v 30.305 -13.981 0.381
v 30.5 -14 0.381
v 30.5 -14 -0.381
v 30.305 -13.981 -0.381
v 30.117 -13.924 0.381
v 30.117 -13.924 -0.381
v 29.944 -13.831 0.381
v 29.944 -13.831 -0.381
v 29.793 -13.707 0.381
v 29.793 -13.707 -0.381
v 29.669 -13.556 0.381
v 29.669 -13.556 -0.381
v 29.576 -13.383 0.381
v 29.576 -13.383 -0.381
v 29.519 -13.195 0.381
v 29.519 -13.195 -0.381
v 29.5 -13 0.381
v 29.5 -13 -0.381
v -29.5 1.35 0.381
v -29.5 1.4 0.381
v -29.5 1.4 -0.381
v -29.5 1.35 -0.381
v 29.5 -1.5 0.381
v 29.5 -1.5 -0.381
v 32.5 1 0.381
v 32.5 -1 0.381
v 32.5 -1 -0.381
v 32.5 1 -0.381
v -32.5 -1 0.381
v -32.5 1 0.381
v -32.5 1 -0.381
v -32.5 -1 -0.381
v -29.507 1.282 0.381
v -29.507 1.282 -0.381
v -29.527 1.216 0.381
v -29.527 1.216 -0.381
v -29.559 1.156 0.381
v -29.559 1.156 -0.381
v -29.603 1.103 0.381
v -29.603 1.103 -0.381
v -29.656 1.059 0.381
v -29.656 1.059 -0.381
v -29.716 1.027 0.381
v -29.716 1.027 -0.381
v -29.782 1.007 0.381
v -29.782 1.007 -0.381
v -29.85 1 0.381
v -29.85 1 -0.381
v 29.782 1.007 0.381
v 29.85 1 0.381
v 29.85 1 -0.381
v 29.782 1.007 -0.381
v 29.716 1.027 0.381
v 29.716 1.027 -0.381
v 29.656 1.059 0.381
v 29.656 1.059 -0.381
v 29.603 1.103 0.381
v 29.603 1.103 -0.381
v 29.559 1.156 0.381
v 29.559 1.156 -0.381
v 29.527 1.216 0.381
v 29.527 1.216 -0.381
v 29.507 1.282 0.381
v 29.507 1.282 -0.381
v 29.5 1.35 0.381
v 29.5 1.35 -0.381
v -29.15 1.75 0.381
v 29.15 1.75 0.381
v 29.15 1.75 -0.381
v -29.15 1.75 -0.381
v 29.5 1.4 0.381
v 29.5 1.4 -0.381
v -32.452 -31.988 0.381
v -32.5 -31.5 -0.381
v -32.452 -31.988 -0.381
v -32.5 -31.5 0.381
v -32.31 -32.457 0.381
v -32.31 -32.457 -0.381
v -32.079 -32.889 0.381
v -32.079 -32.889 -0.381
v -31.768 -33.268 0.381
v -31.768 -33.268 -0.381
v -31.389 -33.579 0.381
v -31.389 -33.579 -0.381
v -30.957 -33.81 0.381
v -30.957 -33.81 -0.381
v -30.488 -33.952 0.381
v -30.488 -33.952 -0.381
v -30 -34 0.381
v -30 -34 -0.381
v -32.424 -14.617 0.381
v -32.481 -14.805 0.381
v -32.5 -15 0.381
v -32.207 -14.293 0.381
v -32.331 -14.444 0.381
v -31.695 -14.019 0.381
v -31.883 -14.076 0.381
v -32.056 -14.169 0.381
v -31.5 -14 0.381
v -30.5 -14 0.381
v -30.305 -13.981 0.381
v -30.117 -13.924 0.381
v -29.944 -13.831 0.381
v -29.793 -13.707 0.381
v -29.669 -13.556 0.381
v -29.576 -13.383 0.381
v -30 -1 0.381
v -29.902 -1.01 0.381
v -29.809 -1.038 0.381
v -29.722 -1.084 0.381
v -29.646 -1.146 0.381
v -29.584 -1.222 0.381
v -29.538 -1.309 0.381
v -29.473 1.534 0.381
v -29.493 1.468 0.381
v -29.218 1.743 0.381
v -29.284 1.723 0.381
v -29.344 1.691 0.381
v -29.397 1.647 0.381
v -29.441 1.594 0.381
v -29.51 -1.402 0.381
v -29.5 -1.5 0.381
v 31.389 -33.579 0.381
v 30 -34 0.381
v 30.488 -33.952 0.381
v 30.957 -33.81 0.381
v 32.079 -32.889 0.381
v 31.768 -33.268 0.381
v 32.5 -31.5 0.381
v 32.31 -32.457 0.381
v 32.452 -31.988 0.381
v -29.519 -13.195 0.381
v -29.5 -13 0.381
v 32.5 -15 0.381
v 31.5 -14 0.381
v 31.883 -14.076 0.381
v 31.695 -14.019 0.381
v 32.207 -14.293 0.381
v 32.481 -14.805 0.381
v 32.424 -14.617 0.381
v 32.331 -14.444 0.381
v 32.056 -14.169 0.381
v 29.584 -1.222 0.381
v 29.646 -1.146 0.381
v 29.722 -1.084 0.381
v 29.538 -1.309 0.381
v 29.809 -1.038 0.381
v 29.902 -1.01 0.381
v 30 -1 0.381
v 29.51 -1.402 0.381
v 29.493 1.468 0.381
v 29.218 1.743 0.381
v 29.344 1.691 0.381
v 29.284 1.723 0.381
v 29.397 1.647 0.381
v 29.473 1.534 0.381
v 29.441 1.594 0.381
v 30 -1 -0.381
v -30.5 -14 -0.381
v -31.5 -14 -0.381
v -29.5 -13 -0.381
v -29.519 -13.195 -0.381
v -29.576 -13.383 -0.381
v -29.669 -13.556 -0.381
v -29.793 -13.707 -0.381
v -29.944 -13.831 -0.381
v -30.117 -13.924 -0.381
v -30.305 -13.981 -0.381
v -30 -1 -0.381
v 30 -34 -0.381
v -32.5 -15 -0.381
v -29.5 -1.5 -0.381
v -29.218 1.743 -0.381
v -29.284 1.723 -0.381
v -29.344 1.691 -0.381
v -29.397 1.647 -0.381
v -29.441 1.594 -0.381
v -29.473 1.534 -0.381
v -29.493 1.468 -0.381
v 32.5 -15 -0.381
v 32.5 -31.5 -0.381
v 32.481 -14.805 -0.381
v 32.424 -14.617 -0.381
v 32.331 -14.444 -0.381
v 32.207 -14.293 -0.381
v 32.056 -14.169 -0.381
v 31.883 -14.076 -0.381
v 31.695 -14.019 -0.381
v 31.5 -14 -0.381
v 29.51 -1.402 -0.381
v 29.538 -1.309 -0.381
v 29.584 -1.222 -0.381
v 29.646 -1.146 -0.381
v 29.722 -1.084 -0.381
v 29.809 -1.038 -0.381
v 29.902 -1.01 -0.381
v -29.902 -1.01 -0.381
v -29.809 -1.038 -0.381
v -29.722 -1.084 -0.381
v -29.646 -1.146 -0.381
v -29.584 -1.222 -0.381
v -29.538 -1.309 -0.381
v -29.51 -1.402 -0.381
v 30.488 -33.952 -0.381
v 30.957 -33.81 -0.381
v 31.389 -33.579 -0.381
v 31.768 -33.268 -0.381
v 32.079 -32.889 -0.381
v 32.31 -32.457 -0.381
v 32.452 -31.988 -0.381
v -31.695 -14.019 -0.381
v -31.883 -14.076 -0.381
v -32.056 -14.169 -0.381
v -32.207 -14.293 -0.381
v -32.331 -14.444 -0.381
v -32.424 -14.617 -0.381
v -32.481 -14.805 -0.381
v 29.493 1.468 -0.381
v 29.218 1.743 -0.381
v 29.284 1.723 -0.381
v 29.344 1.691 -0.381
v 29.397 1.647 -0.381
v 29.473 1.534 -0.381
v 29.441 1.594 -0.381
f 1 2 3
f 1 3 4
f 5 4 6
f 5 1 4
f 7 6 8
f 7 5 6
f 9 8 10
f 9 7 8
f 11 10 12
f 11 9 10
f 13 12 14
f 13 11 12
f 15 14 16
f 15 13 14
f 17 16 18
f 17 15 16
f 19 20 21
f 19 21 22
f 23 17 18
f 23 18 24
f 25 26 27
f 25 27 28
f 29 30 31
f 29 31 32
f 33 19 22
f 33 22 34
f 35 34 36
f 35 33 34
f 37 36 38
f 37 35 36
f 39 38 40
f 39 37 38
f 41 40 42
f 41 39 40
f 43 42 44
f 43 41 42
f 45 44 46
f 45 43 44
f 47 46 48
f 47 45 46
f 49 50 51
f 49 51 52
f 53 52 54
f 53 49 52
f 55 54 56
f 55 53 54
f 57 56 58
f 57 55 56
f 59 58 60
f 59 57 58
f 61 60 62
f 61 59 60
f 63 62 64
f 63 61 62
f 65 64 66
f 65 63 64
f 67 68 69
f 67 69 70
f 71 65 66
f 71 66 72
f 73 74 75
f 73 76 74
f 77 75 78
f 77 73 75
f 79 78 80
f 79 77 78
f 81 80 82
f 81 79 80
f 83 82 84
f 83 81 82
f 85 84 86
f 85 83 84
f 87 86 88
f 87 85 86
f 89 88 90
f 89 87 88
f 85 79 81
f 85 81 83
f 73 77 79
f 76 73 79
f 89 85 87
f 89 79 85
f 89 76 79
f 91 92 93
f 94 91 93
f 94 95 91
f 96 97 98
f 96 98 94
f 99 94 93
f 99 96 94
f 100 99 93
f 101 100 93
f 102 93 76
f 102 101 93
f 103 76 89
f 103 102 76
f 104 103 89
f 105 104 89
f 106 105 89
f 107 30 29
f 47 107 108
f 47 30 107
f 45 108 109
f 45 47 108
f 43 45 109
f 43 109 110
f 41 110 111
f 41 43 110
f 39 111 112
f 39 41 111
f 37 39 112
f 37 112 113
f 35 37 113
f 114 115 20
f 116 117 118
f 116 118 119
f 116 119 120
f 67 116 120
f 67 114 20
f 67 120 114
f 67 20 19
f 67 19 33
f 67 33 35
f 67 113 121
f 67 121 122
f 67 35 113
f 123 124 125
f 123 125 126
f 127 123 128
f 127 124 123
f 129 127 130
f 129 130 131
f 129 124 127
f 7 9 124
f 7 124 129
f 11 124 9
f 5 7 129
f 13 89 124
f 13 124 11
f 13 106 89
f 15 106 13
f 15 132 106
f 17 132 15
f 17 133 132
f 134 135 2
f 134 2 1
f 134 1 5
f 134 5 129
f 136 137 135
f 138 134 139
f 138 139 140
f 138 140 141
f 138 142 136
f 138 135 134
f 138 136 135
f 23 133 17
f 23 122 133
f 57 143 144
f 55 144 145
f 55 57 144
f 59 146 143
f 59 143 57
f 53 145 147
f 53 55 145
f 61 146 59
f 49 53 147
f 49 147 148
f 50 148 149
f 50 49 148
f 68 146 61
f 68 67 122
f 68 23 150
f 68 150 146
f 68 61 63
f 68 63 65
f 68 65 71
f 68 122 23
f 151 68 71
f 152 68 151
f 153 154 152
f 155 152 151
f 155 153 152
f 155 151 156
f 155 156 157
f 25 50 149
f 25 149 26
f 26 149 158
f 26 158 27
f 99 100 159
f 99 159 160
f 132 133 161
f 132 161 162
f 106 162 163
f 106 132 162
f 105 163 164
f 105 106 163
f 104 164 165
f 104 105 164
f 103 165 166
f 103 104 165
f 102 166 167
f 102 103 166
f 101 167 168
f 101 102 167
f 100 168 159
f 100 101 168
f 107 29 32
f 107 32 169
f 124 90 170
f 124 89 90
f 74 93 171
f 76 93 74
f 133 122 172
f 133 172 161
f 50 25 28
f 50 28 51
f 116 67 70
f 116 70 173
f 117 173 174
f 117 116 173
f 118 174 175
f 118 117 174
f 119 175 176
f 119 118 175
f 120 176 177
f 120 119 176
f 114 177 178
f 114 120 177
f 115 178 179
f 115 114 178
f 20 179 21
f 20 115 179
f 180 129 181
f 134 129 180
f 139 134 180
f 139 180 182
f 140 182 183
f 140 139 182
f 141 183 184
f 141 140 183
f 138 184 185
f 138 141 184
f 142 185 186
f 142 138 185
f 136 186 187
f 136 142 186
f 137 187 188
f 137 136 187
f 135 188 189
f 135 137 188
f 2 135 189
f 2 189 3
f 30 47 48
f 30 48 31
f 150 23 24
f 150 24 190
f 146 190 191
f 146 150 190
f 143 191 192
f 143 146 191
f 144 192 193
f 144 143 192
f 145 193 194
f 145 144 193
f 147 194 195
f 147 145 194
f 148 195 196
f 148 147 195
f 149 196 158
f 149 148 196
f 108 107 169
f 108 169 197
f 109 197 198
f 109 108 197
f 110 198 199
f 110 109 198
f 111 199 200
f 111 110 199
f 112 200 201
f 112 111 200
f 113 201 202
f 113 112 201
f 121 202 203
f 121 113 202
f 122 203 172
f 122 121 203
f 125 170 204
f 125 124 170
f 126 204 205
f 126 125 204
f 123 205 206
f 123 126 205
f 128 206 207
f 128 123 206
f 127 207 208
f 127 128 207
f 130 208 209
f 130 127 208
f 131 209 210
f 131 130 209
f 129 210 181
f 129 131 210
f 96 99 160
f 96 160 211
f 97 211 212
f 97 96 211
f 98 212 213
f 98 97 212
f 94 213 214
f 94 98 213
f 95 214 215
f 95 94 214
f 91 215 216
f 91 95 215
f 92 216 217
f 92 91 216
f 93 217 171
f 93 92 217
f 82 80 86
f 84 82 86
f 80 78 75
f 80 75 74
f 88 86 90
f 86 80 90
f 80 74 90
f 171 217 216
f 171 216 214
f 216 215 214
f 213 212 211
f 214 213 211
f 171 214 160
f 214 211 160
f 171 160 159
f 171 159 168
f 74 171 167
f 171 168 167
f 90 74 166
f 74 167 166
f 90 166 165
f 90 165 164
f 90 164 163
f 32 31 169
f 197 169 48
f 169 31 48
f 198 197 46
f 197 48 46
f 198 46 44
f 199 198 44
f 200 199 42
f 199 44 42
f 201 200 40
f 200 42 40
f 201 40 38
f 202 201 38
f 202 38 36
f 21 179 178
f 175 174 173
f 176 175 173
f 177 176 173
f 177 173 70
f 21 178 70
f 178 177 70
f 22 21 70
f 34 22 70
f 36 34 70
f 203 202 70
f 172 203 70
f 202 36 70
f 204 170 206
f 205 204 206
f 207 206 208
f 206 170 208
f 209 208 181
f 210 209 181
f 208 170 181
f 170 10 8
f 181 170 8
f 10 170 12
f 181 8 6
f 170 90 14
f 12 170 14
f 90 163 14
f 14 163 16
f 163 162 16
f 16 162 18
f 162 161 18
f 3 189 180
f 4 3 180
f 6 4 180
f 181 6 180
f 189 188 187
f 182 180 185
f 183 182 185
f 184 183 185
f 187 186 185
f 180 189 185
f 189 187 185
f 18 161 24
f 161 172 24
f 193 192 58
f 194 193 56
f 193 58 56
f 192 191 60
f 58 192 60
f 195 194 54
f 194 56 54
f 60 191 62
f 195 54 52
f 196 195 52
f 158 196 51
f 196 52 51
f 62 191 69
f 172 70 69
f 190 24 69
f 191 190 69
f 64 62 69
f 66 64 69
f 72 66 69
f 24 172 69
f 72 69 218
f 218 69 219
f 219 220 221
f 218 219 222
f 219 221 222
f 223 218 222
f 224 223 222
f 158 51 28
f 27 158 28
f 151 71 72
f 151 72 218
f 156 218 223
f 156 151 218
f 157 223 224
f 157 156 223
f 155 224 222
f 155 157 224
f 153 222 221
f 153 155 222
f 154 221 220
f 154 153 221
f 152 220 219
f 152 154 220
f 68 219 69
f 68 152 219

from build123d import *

# Parameters (mm, degrees)
BOSS_EXTRUDE1_DEPTH      = 0.381
BOSS_EXTRUDE1_DEPTH_BACK = 0.381


with BuildPart() as part:
    # Sketch1 → Boss-Extrude1 (new body, two sides)
    with BuildSketch(Plane.XY) as boss_extrude1_sk:
        with BuildLine():
            Line((-29.5, -34), (29.5, -34))
            Line((29.5, -34), (30, -34))
            ThreePointArc((30, -34), (31.767766953, -33.267766953), (32.5, -31.5))
            Line((32.5, -31.5), (32.5, -15))
            ThreePointArc((32.5, -15), (32.207106781, -14.292893219), (31.5, -14))
            Line((31.5, -14), (30.5, -14))
            ThreePointArc((30.5, -14), (29.792893219, -13.707106781), (29.5, -13))
            Line((29.5, -13), (29.5, -1.5))
            ThreePointArc((29.5, -1.5), (29.646446609, -1.146446609), (30, -1))
            Line((30, -1), (32.5, -1))
            Line((32.5, -1), (32.5, 1))
            Line((32.5, 1), (29.85, 1))
            ThreePointArc((29.85, 1), (29.602512627, 1.102512627), (29.5, 1.35))
            Line((29.5, 1.35), (29.5, 1.4))
            ThreePointArc((29.5, 1.4), (29.397487373, 1.647487373), (29.15, 1.75))
            Line((29.15, 1.75), (-29.15, 1.75))
            ThreePointArc((-29.15, 1.75), (-29.397487373, 1.647487373), (-29.5, 1.4))
            Line((-29.5, 1.4), (-29.5, 1.35))
            ThreePointArc((-29.5, 1.35), (-29.602512627, 1.102512627), (-29.85, 1))
            Line((-29.85, 1), (-32.5, 1))
            Line((-32.5, 1), (-32.5, -1))
            Line((-32.5, -1), (-30, -1))
            ThreePointArc((-30, -1), (-29.646446609, -1.146446609), (-29.5, -1.5))
            Line((-29.5, -1.5), (-29.5, -13))
            ThreePointArc((-29.5, -13), (-29.792893219, -13.707106781), (-30.5, -14))
            Line((-30.5, -14), (-31.5, -14))
            ThreePointArc((-31.5, -14), (-32.207106781, -14.292893219), (-32.5, -15))
            Line((-32.5, -15), (-32.5, -31.5))
            ThreePointArc((-32.5, -31.5), (-31.767766953, -33.267766953), (-30, -34))
            Line((-30, -34), (-29.5, -34))
        make_face()
    extrude(amount=BOSS_EXTRUDE1_DEPTH)
    extrude(boss_extrude1_sk.sketch, amount=-BOSS_EXTRUDE1_DEPTH_BACK)


solid = part.part
